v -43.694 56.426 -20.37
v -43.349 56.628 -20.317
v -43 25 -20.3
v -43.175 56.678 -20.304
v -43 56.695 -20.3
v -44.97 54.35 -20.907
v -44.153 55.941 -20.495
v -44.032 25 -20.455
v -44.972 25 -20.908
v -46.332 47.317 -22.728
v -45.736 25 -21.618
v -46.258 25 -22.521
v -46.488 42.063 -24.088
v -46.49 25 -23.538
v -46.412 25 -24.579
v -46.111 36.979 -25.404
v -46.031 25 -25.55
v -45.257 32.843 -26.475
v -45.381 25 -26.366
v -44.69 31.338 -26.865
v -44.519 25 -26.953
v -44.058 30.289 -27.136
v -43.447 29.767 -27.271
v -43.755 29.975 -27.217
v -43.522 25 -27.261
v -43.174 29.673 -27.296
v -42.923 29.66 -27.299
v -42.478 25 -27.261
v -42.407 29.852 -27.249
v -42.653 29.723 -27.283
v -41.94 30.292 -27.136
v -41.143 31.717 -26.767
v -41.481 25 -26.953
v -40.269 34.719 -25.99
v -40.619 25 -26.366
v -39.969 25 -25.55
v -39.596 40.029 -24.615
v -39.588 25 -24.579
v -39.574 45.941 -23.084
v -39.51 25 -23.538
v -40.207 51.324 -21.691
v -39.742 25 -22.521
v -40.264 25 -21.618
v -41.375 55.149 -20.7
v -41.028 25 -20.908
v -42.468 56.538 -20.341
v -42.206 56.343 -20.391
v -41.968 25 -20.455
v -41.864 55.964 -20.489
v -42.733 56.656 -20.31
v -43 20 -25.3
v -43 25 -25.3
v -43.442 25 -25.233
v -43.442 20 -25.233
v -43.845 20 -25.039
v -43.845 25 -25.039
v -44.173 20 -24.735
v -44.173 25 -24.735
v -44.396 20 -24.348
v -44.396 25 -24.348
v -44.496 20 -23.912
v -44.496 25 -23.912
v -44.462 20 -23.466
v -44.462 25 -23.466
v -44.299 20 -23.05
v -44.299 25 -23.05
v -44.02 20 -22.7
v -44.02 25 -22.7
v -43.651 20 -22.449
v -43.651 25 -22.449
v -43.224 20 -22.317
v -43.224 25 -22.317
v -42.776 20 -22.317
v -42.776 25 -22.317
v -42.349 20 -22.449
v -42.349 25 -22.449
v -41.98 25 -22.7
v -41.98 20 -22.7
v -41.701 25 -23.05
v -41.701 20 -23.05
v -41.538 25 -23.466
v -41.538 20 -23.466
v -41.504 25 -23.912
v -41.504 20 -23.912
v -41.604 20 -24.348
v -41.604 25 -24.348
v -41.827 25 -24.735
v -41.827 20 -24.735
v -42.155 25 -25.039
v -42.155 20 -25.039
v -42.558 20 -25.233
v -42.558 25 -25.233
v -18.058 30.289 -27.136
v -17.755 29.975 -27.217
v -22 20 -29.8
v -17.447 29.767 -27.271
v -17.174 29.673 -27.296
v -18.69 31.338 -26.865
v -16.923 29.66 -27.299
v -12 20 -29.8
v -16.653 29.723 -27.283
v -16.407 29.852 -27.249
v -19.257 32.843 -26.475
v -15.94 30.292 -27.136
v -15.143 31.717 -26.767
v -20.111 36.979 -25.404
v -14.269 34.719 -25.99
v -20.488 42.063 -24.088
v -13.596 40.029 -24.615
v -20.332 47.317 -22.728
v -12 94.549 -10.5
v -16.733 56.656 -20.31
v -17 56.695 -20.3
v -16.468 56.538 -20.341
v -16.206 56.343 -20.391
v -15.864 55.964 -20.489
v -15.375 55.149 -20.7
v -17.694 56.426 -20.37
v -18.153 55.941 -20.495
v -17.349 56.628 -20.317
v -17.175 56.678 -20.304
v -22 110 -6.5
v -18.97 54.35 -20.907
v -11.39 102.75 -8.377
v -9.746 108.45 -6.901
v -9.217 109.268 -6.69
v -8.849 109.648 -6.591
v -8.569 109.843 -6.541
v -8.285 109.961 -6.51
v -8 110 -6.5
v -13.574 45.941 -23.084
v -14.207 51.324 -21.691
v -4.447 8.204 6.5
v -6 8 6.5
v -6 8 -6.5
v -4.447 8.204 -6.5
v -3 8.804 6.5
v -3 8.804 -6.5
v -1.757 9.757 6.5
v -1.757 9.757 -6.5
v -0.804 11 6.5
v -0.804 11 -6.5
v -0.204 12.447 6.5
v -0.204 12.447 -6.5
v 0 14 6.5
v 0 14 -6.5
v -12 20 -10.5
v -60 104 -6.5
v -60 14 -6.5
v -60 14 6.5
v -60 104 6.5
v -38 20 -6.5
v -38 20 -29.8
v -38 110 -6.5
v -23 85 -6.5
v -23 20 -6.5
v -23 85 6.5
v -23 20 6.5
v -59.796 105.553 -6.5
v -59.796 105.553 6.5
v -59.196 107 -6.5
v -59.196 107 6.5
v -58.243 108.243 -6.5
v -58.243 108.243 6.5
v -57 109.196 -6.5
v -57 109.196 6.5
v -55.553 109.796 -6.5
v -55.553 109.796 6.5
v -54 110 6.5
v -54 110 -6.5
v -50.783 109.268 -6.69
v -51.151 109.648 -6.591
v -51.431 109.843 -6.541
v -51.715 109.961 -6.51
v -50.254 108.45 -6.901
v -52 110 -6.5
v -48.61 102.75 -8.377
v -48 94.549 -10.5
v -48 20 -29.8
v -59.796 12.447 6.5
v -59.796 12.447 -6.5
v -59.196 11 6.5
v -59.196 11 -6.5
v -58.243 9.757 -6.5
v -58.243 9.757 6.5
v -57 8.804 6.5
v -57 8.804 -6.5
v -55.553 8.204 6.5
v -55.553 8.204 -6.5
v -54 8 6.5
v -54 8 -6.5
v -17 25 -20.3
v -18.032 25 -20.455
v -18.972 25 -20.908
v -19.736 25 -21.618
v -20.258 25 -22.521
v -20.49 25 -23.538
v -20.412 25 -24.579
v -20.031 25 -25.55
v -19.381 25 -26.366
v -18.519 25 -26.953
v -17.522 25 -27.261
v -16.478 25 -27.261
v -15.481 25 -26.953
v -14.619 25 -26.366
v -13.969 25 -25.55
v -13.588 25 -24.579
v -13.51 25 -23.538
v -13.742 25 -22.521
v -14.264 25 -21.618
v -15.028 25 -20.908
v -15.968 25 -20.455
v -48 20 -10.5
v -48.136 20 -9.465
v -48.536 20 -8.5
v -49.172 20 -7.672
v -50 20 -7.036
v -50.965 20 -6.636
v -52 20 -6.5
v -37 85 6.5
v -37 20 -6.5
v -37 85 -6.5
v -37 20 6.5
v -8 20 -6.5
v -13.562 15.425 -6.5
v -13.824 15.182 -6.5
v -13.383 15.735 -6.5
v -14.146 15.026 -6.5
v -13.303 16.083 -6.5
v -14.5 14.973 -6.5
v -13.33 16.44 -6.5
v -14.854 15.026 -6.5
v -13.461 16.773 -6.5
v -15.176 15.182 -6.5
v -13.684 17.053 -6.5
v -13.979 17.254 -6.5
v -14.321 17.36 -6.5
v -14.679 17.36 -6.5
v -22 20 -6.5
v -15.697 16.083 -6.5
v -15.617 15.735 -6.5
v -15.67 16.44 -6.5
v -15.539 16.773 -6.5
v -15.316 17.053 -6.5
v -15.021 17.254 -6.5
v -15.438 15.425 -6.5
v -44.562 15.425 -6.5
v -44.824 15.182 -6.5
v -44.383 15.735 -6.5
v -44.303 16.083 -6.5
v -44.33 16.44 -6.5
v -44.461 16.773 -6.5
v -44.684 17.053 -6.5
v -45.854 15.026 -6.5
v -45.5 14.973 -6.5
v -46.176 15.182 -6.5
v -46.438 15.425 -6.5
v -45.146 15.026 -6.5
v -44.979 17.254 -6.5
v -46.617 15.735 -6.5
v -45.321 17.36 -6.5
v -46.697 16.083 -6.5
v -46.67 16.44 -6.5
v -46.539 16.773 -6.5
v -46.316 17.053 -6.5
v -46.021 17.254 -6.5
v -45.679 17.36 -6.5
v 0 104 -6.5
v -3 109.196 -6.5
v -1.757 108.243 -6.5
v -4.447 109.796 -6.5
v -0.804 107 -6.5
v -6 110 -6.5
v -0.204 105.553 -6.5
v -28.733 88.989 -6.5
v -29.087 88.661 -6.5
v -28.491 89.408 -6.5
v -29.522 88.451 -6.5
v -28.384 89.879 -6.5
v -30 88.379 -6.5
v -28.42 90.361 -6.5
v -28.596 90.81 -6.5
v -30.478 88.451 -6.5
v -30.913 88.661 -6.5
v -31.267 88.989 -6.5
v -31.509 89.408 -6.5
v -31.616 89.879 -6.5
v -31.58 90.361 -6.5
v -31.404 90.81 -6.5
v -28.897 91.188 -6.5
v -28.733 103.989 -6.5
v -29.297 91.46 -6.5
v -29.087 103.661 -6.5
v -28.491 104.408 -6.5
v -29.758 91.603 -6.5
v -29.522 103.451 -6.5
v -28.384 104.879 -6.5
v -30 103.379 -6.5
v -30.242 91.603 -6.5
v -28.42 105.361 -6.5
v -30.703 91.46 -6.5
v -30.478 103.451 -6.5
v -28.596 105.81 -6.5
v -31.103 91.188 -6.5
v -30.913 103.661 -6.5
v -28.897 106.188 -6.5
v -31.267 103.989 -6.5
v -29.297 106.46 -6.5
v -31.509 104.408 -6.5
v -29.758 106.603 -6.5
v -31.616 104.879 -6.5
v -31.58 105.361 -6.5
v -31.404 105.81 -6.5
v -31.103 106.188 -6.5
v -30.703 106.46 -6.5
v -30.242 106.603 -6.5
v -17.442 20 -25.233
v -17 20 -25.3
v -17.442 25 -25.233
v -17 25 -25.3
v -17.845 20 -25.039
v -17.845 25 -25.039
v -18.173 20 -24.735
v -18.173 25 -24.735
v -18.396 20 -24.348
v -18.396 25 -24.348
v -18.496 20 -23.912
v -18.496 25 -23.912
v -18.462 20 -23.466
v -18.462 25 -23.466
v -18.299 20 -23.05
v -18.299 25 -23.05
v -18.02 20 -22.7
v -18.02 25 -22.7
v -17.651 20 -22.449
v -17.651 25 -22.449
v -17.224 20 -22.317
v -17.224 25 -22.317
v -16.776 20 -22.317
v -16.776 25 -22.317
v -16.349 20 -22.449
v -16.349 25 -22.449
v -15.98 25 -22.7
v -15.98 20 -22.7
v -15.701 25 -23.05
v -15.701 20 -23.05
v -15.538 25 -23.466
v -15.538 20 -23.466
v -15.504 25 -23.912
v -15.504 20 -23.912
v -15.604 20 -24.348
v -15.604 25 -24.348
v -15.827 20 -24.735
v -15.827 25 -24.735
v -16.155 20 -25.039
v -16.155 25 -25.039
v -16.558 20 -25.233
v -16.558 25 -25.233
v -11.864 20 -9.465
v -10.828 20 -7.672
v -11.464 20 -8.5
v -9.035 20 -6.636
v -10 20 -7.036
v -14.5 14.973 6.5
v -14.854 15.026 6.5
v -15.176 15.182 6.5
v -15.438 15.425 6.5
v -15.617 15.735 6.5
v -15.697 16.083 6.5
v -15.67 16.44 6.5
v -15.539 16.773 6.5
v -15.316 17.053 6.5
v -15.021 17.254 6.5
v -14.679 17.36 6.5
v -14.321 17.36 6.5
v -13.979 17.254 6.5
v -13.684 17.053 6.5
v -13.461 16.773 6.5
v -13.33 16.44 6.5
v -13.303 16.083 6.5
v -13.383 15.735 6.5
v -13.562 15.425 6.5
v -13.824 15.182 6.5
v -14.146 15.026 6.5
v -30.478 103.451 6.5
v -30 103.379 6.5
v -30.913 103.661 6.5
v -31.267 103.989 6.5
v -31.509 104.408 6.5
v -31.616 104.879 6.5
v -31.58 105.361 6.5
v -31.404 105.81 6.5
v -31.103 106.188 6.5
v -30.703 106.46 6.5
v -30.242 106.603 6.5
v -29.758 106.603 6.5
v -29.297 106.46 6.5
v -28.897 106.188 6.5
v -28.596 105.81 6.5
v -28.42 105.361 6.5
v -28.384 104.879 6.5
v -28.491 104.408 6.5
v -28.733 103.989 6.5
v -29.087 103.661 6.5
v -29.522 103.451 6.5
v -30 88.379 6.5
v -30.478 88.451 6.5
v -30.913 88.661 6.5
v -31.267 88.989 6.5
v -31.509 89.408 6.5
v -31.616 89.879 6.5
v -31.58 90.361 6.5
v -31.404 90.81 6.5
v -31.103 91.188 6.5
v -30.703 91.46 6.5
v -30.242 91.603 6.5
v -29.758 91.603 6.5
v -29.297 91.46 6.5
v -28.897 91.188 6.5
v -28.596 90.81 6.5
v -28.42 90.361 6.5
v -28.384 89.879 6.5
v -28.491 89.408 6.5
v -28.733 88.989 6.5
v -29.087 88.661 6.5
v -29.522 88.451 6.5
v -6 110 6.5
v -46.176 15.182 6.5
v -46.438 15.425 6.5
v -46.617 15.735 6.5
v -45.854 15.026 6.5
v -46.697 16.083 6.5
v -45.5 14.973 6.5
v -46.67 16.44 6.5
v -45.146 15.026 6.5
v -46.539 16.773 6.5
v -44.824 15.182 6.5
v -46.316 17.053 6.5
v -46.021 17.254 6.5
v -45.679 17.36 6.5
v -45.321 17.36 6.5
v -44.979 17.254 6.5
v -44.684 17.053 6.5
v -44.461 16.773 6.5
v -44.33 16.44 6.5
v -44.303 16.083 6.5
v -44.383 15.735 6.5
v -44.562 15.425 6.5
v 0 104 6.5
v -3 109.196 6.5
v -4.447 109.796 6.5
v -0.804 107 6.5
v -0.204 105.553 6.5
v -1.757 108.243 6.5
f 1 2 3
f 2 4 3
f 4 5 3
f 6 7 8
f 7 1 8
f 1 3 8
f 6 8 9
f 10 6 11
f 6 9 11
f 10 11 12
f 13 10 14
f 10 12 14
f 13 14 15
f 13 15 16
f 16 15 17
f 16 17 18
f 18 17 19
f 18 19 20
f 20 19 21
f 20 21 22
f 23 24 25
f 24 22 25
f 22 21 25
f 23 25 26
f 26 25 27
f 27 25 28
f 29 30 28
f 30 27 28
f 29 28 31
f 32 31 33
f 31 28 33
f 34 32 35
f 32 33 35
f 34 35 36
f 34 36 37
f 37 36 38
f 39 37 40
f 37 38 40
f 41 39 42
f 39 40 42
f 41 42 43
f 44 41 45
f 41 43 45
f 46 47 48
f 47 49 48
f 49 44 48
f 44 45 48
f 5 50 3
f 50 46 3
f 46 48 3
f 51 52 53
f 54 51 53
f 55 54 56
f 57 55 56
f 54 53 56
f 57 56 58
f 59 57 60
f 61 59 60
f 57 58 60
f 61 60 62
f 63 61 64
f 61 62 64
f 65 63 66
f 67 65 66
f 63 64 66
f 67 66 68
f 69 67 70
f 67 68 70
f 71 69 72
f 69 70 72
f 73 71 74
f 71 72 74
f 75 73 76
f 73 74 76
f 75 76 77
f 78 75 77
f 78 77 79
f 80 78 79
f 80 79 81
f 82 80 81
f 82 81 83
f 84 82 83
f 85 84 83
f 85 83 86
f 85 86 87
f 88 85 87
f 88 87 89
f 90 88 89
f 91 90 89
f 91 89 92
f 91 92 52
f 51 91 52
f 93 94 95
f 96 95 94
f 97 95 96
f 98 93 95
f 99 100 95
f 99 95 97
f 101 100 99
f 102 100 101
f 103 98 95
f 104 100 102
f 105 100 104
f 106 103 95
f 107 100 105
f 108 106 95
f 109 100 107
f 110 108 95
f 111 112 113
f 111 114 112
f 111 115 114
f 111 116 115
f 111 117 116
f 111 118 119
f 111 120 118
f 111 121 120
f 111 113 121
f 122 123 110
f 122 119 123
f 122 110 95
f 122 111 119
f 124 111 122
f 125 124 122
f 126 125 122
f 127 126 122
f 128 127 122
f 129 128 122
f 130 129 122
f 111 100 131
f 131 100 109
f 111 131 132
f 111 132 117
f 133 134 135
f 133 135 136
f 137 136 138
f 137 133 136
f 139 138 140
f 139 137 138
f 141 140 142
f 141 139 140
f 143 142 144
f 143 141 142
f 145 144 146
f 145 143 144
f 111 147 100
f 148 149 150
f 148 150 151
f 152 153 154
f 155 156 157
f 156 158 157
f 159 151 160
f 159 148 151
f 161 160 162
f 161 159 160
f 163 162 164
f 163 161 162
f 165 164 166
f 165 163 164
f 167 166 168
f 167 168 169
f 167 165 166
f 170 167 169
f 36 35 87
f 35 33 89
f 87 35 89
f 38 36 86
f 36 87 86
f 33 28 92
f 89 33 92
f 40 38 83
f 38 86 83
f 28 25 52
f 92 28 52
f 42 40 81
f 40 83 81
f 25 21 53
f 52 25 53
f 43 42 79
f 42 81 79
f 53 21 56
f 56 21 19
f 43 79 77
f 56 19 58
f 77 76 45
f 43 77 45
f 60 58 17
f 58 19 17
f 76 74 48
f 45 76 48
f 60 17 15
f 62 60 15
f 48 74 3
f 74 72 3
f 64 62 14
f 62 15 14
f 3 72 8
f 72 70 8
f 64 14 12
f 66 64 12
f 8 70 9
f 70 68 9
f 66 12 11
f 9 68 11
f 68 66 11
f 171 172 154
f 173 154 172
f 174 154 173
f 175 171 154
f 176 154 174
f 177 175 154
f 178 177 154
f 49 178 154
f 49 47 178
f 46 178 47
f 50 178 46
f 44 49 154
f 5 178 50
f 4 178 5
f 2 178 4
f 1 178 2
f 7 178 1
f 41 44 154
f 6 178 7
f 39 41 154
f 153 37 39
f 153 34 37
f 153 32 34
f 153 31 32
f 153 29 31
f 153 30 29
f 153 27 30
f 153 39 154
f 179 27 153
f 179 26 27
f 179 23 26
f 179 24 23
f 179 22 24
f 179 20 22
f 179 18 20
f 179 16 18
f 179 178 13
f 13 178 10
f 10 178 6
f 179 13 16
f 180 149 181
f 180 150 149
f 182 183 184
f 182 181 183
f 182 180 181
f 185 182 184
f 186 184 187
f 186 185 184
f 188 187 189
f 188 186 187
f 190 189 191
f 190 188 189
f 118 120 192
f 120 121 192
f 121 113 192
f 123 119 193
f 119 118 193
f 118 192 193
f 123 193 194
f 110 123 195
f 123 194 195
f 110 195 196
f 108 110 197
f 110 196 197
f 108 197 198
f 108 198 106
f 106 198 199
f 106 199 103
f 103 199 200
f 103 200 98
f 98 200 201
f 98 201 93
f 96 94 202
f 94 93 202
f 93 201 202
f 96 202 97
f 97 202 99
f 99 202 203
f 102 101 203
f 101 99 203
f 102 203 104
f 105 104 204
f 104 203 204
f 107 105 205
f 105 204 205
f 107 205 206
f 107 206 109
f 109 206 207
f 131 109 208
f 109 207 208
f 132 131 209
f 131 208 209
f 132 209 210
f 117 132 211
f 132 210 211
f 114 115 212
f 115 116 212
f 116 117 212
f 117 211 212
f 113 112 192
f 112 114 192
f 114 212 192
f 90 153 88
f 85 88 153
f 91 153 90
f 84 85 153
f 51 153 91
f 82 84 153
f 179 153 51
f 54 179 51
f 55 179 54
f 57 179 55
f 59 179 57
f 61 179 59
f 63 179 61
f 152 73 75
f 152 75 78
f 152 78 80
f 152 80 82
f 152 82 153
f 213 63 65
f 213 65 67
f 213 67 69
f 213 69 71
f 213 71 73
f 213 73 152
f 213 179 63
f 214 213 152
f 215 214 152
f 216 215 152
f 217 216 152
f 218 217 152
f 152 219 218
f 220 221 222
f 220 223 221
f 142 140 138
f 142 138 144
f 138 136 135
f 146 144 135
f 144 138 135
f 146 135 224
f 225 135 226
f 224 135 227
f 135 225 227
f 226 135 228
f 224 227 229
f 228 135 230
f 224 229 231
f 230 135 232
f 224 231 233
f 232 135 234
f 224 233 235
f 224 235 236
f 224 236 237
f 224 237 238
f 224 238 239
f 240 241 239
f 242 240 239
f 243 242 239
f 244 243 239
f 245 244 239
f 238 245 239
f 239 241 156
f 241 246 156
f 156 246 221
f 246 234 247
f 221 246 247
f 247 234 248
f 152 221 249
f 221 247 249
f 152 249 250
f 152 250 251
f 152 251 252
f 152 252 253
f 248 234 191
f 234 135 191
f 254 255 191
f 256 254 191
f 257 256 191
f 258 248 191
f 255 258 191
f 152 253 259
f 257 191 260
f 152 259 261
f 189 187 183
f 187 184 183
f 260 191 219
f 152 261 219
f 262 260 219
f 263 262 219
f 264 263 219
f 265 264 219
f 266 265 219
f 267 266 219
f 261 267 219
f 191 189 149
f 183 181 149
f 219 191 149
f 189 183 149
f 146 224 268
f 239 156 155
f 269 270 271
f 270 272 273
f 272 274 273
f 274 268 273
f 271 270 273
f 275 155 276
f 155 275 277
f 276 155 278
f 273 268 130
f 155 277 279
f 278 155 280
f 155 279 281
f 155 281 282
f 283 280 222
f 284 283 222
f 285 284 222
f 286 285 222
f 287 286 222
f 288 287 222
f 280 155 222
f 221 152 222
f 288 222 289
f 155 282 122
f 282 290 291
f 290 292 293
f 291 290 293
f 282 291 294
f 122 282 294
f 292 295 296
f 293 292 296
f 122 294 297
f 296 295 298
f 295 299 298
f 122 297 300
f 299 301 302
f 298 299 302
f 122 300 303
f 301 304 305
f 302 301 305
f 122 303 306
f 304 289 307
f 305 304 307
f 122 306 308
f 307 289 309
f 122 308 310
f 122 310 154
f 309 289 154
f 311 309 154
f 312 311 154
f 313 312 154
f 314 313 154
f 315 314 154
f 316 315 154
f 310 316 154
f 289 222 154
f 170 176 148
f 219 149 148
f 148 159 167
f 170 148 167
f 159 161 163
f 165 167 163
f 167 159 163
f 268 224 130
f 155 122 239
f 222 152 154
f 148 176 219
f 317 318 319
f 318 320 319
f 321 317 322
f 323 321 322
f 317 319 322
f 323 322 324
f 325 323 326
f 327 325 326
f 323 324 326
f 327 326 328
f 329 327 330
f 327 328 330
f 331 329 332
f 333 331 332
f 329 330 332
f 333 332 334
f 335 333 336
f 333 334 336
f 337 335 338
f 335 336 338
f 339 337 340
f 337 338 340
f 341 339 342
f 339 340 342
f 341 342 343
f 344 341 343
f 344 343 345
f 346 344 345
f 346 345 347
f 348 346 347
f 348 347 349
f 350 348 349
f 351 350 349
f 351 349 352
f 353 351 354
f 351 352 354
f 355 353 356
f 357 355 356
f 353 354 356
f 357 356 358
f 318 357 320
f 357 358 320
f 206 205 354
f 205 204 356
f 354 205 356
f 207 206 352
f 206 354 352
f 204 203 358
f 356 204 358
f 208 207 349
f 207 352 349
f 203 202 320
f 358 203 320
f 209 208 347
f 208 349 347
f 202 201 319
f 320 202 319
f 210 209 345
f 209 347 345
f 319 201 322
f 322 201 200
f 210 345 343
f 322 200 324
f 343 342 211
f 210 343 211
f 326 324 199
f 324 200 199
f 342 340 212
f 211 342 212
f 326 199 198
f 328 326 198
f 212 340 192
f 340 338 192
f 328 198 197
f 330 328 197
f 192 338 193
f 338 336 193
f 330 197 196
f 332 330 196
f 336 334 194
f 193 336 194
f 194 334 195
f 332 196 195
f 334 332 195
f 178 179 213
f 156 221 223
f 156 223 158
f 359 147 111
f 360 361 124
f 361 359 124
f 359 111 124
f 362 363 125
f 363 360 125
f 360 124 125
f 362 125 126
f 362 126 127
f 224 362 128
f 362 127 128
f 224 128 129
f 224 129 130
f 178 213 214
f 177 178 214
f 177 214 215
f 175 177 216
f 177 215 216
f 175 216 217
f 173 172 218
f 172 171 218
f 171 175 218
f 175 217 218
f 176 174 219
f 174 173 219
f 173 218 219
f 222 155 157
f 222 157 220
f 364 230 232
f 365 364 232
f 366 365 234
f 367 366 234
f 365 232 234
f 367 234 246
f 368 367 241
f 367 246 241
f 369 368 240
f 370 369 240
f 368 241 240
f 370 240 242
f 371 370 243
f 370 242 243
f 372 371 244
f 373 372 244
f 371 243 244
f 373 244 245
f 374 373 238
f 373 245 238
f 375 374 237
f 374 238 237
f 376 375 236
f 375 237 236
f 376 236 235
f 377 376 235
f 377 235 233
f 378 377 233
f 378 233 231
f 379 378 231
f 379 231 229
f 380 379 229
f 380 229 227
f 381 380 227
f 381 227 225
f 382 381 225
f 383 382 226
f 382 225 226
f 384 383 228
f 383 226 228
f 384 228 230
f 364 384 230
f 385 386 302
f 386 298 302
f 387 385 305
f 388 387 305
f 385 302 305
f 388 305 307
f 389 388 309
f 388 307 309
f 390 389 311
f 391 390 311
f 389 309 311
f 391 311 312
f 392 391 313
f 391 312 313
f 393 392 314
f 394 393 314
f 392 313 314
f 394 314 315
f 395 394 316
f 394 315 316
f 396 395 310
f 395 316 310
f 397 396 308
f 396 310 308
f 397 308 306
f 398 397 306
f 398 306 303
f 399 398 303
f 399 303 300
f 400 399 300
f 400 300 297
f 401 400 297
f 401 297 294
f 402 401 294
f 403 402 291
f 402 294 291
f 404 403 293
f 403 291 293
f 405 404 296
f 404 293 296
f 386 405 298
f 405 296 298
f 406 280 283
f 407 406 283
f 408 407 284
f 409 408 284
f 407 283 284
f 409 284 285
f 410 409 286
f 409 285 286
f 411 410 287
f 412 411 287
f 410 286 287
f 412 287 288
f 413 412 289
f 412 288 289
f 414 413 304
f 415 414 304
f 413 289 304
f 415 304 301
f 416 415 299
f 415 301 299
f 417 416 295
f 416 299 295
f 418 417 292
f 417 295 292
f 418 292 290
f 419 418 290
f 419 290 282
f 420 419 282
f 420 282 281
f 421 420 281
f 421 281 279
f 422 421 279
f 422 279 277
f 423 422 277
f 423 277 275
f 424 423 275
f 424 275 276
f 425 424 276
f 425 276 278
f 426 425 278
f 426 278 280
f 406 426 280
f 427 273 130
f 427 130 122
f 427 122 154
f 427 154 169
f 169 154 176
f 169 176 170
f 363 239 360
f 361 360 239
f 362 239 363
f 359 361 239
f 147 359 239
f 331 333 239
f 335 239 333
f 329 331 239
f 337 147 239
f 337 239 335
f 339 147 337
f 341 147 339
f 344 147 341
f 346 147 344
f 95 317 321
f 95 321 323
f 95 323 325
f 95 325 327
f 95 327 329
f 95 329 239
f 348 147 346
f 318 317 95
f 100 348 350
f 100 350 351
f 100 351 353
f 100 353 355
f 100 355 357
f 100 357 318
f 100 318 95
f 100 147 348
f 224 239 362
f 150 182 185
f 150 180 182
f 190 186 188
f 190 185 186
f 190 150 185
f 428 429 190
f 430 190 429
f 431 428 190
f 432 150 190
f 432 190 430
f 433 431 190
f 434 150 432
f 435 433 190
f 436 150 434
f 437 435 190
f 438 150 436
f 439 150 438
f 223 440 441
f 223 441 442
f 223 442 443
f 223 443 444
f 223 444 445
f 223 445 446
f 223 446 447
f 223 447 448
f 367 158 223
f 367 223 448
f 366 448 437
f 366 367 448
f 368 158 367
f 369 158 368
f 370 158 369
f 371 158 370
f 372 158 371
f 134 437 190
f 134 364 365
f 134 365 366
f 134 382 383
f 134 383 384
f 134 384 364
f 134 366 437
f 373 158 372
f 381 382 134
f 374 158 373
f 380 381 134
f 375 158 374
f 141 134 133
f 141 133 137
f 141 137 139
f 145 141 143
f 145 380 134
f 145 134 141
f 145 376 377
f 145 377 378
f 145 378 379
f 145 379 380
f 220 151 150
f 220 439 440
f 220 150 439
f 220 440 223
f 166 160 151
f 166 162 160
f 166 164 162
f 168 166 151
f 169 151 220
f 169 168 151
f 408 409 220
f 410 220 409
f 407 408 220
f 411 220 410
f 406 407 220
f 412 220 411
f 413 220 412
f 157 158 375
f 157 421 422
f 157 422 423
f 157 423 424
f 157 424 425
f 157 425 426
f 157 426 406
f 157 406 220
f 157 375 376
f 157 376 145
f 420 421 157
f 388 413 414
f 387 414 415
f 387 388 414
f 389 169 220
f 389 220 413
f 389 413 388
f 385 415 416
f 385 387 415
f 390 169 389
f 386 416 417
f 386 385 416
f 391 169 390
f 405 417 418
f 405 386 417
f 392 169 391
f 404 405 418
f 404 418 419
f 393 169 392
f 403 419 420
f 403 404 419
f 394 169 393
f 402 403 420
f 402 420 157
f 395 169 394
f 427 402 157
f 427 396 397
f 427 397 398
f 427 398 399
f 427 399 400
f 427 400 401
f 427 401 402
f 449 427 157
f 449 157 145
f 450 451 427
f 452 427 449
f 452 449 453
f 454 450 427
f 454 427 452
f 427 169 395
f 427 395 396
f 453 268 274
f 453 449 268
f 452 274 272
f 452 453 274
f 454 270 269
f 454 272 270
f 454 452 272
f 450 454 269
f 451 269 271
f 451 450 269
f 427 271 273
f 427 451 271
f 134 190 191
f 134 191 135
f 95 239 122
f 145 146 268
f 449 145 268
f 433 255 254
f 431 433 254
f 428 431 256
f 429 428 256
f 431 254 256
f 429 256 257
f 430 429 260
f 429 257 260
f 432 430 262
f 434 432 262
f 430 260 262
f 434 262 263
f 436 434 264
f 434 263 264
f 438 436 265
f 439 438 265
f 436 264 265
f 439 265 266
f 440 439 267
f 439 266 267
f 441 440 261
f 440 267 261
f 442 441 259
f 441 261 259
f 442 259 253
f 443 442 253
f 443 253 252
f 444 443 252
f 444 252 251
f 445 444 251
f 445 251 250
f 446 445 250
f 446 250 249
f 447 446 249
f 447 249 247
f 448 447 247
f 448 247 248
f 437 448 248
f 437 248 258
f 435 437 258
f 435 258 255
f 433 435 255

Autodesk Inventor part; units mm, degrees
ref_plane "YZ Plane" through (0, 0, 0) normal (1, 0, 0) x (0, 1, 0)
sketch "Sketch1" plane through (0, 0, 0) normal (0, 0, 1) x (1, 0, 0)
  line L0 (0, 0) -> (-60, 0)
  line L1 (-60, 0) -> (-60, 20)
  line L2 (-60, 20) -> (-60, 110)
  line L3 (-60, 110) -> (-30, 110)
  line L4 (-30, 0) -> (-30, 110)
  line L5 (-30, 20) -> (-55.65, 20)
  line L6 (-55.65, 20) -> (-55.65, 85)
  line L7 (-55.65, 85) -> (-30, 85)
  line L8 (0, 20) -> (0, 110)
  line L9 (0, 110) -> (-30, 110)
  line L10 (-30, 20) -> (-4.35, 20)
  line L11 (-4.35, 20) -> (-4.35, 85)
  line L12 (-4.35, 85) -> (-30, 85)
  line L13 (0, 0) -> (0, 20)
  line L14 (-30, 20) -> (-45, 20)
  dimension "d0" = 60
  dimension "d1" = 20
  dimension "d2" = 90
  dimension "d3" = 65
  dimension "d39" = 15
extrude "Extrusion1" add sketch "Sketch1" along normal mid plane 13 contours L0 L4 L10 L11 L12 L9 L8 L13 | L0 L1 L2 L3 L4 L7 L6 L5
sketch "Sketch2" plane through (0, 0, 6.5) normal (1, 0, 0) x (0, 0, -1)
  line L0 (13, 0) -> (13, 110) projected
  line L1 (13, 0) -> (13, 20)
  line L2 (13, 20) -> (36.3, 20)
  line L3 (36.3, 20) -> (13, 110)
  point P0 (6.5, 0)
  dimension "d6" = 20
  dimension "d7" = 23.3
extrude "Extrusion2" add sketch "Sketch2" against normal blind 22
ref_plane "Work Plane1" through (-30, 20, 6.5) normal (-1, 0, 0) x (0, 0, 1)
mirror "Mirror1" about plane through (-30, 20, 6.5) normal (-1, 0, 0) of "Extrusion2"
sketch "Sketch3" plane through (0, 0, 6.5) normal (0, 0, 1) x (1, 0, 0)
  line L0 (-4.35, 20) -> (-55.65, 20) projected
  line L1 (-30, 20) -> (-30, 0)
  line L2 (-60, 0) -> (0, 0) projected
  line L3 (-30, 16.1731) -> (-45.5, 16.1731)
  line L4 (-30, 16.1731) -> (-14.5, 16.1731)
  dimension "d17" = 15.5
sketch "Sketch4" plane through (0, 0, 6.5) normal (0, 0, 1) x (1, 0, 0)
  line L0 (-55.65, 85) -> (-4.35, 85) projected
  line L1 (-30, 85) -> (-30, 110)
  line L2 (0, 110) -> (-60, 110) projected
  line L3 (-30, 85) -> (-30, 90)
  line L4 (-30, 90) -> (-30, 105)
  point P0 (0, 0)
  dimension "d25" = 5
  dimension "d26" = 15
hole "Hole2" at (-30, 90, 6.5) at (-30, 105, 6.5) direction (0, 0, -1) diameter 3.242 end through all thread size "M4x0.7" class "6H" standard "ISO Metric profile"
sketch "Sketch5" plane through (-60, 20, -29.8) normal (0, -1, 0) x (1, 0, 0)
  line L0 (0, 0) -> (22, 0) projected
  line L1 (0, 0) -> (0, 6)
  line L2 (0, 0) -> (0, 23.3) projected
  line L3 (0, 6) -> (60, 6)
  line L4 (60, 0) -> (60, 23.3) projected
  line L5 (60, 6) -> (43, 6)
  line L6 (0, 6) -> (17, 6)
  point P0 (60, 29.8)
  point P1 (17, 6)
  dimension "d34" = 6
  dimension "d35" = 17
  dimension "d36" = 17
hole "Hole3" at (-43, 20, -23.8) at (-17, 20, -23.8) direction (0, 1, 0) diameter 3 end through all
sketch "Sketch6" plane through (0, 0, 6.5) normal (1, 0, 0) x (0, 0, -1)
  line L0 (13, 110) -> (0, 110) projected
  line L1 (13, 0) -> (13, 20) projected
  line L2 (13, 110) -> (13, 20)
  line L3 (36.3, 20) -> (13, 20) projected
  line L4 (13, 20) -> (36.3, 20)
  line L5 (13, 110) -> (36.3, 20) projected
  line L6 (36.3, 20) -> (13, 110)
  point P0 (6.5, 0)
extrude "Extrusion3" cut sketch "Sketch6" against normal blind 12
mirror "Mirror2" about plane through (-30, 20, 6.5) normal (-1, 0, 0) of "Extrusion3"
sketch "Sketch8" plane through (0, 0, 6.5) normal (0, 0, 1) x (1, 0, 0)
  line L0 (-4.35, 20) -> (-55.65, 20) projected
  line L1 (-30, 20) -> (-30, 85)
  line L2 (-55.65, 85) -> (-4.35, 85) projected
  line L3 (-30, 20) -> (-37, 20)
  line L4 (-37, 20) -> (-37, 85)
  line L5 (-55.65, 20) -> (-55.65, 85) projected
  line L6 (-37, 85) -> (-55.65, 85)
  line L7 (-55.65, 85) -> (-55.65, 20)
  line L8 (-55.65, 20) -> (-37, 20)
  line L9 (-23, 20) -> (-23, 85)
  line L10 (-4.35, 20) -> (-4.35, 85)
  line L11 (-23, 85) -> (-4.35, 85)
  line L12 (-4.35, 85) -> (-4.35, 20)
  line L13 (-4.35, 20) -> (-23, 20)
  point P0 (0, 0)
  point P1 (-23, 85)
  dimension "d43" = 7
extrude "Extrusion5" add sketch "Sketch8" against normal blind 13 contours L0 L9 L2 L10 | L0 L5 L2 L4
sketch "Sketch9" plane through (-60, 0, 6.5) normal (0, -1, 0) x (1, 0, 0)
  line L0 (60, -13) -> (60, 0) projected
  line L1 (60, 0) -> (0, 0) projected
  line L2 (60, -13) -> (0, -13)
  line L3 (0, -13) -> (0, 0)
  line L4 (0, 0) -> (60, 0)
  line L5 (60, 0) -> (60, -13)
  point P0 (60, -6.5)
extrude "Extrusion6" cut sketch "Sketch9" against normal blind 8
fillet "Fillet1" radius 6 4 edges at (0, 8, 0) (-60, 8, 0) (-60, 110, 0) (0, 110, 0)
fillet "Fillet2" radius 4 2 edges at (-48, 65, -6.5) (-12, 65, -6.5)
ref_plane "Work Plane2" through (-54, 110, 6.5) normal (0, 1, 0) x (1, 0, 0)
sketch "Sketch10" plane through (-54, 110, 6.5) normal (0, 1, 0) x (1, 0, 0)
  circle A0 centre (11, 30.3) radius 1.5 projected
  line L0 (11, 30.3) -> (11, 36.3)
  line L1 (6, 36.3) -> (16, 36.3) projected
  circle A1 centre (37, 30.3) radius 1.5 projected
  line L2 (37, 30.3) -> (37, 36.3)
  line L3 (42, 36.3) -> (32, 36.3) projected
  point P0 (54, 6.5)
hole "Hole4" at (-43, 110, -23.8) at (-17, 110, -23.8) direction (0, -1, 0) diameter 7 depth 85
hole "Hole5" at (-14.5, 16.1731, 6.5) at (-45.5, 16.1731, 6.5) direction (0, 0, -1) diameter 2.4 end through all clearance for "Countersunk Flat Head Screw ISO 2009/7046" size "M2" standard "ISO"
thread "Thread1" size "M5x0.8" class "6H" standard "ISO Metric profile" full length
thread "Thread2" size "M5x0.8" class "6H" standard "ISO Metric profile" full length
properties part number "stand_less_rough"
